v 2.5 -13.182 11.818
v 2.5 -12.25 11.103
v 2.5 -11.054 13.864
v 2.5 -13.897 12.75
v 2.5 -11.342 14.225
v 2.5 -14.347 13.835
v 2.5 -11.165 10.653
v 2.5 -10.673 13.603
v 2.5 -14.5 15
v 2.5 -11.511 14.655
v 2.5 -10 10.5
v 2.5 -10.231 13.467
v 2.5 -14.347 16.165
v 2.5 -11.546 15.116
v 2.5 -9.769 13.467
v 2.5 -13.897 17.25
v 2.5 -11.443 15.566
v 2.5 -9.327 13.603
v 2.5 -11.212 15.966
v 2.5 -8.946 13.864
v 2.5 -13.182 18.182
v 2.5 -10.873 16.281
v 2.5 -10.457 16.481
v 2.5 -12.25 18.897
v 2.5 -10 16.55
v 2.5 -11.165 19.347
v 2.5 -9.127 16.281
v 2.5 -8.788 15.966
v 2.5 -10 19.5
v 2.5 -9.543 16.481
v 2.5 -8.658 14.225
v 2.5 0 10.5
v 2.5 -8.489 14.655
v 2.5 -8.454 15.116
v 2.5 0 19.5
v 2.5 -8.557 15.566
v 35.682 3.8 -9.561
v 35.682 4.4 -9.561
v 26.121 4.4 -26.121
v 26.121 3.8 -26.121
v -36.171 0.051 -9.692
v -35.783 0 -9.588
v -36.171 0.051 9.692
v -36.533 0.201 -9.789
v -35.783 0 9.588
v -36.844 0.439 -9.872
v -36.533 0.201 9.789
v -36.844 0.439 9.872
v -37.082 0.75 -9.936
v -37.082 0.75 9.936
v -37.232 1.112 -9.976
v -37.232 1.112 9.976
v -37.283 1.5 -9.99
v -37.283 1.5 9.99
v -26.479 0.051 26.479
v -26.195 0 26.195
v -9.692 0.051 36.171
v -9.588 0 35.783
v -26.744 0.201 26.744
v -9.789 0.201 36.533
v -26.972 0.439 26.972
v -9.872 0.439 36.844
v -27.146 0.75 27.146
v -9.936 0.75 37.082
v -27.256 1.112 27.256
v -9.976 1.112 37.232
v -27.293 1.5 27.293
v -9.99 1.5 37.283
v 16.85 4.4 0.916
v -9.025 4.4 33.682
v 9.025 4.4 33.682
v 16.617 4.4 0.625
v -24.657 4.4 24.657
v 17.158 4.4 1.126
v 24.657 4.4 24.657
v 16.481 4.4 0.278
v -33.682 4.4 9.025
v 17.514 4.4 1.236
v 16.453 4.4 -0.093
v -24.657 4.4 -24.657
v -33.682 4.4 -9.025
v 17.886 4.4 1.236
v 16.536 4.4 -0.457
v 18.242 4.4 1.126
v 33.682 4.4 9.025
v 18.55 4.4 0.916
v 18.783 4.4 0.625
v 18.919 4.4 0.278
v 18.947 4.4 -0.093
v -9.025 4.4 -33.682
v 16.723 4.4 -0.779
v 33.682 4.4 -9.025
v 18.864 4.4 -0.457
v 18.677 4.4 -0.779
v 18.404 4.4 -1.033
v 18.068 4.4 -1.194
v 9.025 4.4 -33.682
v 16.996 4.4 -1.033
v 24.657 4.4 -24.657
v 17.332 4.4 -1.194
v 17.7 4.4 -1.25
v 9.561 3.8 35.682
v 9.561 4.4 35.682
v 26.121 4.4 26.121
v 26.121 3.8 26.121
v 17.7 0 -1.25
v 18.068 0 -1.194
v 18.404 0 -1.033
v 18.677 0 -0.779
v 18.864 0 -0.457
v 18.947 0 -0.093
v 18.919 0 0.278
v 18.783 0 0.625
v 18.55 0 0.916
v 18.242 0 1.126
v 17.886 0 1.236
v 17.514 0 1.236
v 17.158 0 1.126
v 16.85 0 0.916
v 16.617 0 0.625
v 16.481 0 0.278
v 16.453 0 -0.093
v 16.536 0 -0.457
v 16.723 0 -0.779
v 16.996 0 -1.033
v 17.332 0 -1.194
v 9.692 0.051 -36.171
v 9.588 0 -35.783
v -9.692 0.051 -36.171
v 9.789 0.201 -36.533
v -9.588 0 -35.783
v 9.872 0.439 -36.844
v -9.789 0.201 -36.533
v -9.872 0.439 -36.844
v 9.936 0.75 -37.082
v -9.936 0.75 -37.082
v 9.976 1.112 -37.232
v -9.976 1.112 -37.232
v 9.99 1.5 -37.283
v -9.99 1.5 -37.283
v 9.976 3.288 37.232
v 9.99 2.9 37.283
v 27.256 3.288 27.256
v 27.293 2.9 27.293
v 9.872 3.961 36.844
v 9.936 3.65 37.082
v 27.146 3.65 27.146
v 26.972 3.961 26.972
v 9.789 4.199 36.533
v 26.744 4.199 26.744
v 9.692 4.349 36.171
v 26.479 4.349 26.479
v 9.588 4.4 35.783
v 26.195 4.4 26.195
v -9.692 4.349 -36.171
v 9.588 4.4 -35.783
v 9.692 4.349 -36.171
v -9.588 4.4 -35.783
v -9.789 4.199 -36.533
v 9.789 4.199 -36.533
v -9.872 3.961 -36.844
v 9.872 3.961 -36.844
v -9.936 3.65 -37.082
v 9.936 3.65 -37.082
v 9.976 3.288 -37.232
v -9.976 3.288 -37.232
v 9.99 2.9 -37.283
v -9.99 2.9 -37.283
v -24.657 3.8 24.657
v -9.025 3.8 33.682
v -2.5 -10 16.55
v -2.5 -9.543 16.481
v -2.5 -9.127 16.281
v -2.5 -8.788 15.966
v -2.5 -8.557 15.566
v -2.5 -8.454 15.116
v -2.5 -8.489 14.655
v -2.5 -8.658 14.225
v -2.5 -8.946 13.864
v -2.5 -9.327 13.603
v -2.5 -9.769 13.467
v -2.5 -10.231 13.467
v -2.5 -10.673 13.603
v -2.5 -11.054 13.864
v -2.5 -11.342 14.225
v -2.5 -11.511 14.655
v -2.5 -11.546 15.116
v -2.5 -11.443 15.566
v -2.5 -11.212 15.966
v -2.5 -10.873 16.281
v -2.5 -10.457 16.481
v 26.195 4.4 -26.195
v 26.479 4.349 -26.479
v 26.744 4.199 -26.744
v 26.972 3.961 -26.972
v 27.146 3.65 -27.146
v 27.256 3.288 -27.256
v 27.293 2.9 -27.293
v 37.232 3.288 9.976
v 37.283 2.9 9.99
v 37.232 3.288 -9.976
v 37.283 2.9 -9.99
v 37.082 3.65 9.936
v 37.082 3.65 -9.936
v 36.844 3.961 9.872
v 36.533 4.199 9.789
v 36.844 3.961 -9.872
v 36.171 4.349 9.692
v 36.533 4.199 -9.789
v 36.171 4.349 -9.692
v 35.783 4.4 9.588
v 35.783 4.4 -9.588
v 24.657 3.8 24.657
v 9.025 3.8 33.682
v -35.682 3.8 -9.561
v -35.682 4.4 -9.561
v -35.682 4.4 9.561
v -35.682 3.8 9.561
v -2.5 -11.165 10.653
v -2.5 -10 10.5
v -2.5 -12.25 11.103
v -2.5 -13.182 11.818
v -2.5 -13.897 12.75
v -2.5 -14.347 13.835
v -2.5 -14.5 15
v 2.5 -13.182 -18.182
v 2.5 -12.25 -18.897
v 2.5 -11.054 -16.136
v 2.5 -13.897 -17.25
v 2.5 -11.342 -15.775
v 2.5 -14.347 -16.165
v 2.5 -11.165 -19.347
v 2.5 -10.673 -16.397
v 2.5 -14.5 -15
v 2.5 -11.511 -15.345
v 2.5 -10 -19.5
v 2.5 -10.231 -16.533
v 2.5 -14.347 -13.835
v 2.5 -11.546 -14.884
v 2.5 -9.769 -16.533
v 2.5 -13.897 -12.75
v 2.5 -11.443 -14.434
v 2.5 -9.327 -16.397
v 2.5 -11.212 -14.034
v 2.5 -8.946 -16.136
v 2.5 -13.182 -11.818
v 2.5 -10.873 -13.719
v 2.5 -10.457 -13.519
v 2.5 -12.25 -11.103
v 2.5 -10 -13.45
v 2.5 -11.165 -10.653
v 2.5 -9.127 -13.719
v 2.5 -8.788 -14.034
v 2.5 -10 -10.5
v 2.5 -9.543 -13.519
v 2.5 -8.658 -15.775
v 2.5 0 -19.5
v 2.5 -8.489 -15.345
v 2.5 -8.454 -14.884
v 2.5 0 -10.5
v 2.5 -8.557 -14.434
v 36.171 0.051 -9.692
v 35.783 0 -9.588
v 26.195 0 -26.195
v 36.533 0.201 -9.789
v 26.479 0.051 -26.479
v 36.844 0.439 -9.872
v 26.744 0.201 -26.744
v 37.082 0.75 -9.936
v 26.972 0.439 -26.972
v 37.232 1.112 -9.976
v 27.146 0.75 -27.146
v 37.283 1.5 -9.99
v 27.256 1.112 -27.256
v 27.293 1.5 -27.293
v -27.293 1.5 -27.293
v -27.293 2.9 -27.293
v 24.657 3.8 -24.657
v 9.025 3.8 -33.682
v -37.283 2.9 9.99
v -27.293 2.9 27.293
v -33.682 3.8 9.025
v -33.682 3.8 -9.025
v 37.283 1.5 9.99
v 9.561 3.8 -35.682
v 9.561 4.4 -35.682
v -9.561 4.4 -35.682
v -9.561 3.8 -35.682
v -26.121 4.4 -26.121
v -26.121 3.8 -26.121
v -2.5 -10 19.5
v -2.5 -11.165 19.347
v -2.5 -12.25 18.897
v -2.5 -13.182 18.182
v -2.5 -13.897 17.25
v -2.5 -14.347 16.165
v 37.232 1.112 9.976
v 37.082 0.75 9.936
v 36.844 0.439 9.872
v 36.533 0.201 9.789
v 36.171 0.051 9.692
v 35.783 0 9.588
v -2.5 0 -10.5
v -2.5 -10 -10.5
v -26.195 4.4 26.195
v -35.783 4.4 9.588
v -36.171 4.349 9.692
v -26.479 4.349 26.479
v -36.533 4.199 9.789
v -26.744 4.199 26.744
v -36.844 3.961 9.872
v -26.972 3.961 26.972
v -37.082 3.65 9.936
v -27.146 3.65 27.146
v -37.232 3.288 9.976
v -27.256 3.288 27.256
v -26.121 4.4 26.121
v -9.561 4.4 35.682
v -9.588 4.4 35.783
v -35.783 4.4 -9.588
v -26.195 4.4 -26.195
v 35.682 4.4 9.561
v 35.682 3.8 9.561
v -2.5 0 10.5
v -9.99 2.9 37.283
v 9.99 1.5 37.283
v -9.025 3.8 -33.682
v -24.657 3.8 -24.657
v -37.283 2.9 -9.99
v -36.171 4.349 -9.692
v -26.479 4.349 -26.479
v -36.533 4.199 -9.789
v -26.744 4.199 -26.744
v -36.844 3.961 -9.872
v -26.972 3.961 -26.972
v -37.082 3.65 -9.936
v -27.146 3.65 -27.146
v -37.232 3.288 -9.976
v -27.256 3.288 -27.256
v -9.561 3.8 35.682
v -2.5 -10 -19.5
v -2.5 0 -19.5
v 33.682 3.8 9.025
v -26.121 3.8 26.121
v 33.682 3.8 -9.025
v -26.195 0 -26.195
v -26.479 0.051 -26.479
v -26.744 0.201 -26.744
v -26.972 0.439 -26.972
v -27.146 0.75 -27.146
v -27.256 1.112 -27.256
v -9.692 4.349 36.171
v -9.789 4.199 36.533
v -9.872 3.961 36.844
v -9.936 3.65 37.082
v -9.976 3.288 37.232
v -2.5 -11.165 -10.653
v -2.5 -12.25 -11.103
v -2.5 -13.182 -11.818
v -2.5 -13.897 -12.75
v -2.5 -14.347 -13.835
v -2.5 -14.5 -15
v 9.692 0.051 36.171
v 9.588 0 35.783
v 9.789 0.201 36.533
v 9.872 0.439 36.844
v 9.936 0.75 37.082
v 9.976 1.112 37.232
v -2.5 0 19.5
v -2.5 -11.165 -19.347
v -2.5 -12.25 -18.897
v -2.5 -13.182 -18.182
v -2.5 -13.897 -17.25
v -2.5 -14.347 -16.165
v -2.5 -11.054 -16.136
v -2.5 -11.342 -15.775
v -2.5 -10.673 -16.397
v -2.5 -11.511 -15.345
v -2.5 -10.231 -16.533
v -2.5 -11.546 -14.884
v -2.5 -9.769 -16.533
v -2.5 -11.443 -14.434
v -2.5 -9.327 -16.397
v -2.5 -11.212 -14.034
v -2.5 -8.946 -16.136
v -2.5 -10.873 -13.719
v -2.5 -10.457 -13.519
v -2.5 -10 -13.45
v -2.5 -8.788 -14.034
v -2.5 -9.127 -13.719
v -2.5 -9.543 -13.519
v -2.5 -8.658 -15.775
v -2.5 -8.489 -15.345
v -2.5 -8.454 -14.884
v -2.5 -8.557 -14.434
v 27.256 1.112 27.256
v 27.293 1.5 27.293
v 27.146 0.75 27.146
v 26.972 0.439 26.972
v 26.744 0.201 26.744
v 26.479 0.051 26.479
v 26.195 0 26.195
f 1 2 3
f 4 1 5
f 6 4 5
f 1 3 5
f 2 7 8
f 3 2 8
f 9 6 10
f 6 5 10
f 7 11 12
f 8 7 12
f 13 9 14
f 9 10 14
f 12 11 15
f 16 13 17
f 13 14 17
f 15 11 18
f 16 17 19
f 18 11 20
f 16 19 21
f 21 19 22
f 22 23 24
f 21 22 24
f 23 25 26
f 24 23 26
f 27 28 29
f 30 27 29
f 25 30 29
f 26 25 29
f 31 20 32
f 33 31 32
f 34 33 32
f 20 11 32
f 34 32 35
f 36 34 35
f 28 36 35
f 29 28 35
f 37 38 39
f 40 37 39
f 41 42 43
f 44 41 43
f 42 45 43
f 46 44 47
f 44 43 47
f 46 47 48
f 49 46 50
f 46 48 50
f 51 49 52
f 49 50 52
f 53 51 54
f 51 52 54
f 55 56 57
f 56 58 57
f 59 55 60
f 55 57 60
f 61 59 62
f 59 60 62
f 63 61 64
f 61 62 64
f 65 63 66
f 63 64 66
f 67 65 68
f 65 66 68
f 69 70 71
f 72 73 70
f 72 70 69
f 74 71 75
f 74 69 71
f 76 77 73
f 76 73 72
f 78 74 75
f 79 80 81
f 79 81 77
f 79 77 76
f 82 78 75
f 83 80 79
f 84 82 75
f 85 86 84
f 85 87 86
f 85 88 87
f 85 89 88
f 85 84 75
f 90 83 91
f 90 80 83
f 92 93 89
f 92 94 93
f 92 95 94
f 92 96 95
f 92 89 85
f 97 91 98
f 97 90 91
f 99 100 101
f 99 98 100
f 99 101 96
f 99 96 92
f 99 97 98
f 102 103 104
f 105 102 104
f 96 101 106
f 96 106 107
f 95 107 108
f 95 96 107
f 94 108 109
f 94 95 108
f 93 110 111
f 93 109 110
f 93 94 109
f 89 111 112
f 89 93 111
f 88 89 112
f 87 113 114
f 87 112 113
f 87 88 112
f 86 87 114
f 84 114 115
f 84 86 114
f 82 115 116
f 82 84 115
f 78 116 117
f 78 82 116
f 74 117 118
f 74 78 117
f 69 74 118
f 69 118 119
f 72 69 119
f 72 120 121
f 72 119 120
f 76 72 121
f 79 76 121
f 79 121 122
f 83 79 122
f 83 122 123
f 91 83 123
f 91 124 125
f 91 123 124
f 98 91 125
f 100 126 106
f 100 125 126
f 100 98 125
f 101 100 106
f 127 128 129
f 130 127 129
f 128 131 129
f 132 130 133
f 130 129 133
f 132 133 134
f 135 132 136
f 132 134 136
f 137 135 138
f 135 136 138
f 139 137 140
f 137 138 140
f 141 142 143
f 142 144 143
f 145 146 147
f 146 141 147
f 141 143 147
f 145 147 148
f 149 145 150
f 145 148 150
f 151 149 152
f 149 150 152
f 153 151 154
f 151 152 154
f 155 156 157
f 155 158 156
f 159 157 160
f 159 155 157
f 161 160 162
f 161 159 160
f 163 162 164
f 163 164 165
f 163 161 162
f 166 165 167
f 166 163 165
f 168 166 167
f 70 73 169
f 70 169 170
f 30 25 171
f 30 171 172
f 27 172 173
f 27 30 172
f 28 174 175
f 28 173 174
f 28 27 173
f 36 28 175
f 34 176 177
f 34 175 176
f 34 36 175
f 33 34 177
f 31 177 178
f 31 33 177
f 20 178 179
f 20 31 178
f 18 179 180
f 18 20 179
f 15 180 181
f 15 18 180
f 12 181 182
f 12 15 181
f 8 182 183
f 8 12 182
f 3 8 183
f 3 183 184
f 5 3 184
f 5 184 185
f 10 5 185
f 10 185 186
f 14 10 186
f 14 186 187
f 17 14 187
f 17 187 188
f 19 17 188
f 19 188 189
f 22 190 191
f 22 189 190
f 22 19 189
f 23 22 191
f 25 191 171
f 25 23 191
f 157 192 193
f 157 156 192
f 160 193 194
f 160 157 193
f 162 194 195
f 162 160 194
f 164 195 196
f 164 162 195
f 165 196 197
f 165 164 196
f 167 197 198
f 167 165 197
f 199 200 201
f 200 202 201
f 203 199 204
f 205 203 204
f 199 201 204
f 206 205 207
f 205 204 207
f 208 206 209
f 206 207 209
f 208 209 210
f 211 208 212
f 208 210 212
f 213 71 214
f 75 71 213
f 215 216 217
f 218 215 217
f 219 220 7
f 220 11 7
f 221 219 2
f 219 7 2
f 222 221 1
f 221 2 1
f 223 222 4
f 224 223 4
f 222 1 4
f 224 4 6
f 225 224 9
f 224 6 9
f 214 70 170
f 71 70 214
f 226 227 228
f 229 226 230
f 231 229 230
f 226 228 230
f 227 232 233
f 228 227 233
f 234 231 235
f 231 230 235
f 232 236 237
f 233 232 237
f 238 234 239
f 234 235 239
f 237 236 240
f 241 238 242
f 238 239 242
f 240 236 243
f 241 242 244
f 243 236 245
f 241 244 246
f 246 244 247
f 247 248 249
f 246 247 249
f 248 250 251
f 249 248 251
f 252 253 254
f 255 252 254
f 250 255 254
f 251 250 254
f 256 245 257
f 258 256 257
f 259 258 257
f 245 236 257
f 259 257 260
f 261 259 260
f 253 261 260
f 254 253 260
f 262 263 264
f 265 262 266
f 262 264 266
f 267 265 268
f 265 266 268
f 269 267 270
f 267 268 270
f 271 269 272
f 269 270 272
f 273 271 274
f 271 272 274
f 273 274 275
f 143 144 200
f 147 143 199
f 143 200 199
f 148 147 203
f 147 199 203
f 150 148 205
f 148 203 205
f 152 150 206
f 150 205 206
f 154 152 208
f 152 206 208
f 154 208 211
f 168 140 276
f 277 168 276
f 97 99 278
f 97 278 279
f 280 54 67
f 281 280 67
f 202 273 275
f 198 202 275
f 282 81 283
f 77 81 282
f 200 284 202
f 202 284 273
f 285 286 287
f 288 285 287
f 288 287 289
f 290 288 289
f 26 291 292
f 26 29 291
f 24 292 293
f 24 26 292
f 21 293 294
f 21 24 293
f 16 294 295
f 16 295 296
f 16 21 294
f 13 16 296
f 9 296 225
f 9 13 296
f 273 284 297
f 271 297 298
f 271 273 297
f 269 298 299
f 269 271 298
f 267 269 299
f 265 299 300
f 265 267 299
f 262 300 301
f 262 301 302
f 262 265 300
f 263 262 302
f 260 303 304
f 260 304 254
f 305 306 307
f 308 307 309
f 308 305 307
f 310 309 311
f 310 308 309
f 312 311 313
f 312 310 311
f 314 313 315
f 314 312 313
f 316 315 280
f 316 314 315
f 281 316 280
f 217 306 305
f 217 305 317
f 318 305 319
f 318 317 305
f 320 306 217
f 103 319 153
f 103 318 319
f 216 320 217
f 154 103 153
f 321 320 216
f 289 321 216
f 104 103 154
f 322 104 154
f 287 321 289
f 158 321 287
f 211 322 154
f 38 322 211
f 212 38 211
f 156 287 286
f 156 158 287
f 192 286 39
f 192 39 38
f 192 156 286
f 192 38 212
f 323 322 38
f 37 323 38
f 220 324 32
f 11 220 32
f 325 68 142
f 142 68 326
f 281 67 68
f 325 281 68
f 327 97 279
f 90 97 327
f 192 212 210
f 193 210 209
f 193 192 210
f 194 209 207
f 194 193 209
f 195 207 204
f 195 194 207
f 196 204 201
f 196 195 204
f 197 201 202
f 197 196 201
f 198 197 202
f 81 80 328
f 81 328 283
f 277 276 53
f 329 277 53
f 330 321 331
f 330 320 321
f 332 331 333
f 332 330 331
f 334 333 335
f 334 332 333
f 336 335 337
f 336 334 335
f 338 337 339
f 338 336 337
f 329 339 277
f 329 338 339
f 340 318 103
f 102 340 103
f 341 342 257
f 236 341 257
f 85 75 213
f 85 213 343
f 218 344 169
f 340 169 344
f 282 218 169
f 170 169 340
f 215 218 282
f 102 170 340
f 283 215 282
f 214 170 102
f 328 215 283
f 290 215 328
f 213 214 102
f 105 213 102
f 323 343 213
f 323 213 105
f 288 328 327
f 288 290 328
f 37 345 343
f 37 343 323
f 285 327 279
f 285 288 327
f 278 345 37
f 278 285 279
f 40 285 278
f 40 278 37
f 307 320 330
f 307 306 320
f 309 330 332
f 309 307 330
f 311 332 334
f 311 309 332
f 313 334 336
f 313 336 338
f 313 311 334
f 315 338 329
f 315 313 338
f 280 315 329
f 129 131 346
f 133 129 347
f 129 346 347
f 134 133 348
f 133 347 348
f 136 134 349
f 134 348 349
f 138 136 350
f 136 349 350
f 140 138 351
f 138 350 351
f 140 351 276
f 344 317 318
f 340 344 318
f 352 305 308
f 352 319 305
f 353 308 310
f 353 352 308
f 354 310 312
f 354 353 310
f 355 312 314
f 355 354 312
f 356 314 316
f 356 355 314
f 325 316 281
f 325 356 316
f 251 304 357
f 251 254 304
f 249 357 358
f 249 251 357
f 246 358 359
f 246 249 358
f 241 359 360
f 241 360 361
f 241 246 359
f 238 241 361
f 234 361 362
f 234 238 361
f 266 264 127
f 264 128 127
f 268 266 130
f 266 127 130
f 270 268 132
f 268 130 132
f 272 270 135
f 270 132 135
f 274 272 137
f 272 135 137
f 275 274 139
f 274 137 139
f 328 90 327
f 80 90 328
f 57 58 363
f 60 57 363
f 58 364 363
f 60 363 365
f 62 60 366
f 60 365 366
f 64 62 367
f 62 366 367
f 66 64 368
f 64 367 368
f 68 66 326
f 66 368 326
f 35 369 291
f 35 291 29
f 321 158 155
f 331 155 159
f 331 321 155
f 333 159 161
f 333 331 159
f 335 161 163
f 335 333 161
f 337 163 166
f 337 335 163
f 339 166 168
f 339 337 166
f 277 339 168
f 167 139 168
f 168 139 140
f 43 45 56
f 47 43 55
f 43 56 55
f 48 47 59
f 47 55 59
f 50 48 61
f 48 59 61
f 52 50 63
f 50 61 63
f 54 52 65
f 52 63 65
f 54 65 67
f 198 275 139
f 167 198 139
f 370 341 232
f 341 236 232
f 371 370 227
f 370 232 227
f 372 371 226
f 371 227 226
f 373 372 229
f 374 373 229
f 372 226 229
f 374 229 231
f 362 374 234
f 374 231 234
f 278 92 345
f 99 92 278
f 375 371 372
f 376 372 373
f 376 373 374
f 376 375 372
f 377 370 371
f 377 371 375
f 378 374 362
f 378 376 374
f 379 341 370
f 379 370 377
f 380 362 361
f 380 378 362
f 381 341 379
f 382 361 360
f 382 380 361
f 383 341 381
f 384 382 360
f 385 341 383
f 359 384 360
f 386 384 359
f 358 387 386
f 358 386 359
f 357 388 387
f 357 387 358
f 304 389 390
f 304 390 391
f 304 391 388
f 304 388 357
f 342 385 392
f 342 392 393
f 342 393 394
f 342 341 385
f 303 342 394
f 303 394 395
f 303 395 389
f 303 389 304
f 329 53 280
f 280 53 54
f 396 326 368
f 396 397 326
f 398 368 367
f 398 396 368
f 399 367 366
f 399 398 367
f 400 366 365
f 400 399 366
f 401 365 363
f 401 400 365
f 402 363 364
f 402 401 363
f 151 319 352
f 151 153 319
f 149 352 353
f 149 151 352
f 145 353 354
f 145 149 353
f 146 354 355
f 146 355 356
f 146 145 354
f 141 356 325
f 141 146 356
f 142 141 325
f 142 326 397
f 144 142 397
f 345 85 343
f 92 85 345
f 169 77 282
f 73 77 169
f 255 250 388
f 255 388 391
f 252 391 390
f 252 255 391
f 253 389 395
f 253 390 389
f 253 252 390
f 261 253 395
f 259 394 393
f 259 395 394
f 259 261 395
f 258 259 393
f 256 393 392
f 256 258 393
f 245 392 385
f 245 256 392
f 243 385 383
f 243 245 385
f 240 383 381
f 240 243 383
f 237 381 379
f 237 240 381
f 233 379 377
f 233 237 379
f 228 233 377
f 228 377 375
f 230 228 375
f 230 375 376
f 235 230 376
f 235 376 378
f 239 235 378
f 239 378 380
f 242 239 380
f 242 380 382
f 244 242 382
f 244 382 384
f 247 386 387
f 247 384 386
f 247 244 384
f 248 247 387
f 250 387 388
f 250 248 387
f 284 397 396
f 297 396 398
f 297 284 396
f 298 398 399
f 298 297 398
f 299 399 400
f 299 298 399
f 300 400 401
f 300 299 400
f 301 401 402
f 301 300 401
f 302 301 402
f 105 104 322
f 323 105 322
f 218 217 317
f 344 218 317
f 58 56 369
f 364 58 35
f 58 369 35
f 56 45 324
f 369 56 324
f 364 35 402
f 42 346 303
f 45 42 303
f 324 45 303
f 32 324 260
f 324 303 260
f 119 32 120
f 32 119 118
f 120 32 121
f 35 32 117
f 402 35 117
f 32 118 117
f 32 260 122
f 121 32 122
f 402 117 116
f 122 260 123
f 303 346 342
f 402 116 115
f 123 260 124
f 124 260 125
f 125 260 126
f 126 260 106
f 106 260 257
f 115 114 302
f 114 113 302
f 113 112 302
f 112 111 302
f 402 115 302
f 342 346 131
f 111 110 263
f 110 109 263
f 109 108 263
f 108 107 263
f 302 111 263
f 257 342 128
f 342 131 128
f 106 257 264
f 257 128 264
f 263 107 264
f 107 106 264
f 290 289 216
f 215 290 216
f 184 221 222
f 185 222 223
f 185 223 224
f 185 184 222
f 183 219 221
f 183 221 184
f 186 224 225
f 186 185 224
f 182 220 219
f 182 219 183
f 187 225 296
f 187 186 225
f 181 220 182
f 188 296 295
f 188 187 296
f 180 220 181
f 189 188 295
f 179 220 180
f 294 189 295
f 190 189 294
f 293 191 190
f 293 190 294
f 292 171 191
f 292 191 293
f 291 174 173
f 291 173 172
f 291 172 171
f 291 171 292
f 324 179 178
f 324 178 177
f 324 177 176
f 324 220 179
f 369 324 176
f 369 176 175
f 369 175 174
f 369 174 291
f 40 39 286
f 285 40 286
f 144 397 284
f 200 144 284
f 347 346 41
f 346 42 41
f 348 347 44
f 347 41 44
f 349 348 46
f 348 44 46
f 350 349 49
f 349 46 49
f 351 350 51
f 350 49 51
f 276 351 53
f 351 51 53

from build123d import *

# Parameters (mm, degrees)
EXTRUDE_1_DEPTH          = 4.4
CUT_EXTRUDE_1_DEPTH      = 0.6
FILLET_1_R               = 1.5
SKETCH_3_W               = 5
SKETCH_3_H               = 9
EXTRUDE_2_DEPTH          = 14.5
FILLET_2_R               = 4.5
CUT_EXTRUDE_2_DEPTH      = 57.417976641
CUT_EXTRUDE_2_DEPTH_BACK = 57.417976641
SKETCH_4_R               = 1.55
CUT_EXTRUDE_3_DEPTH      = 55.68383811
CUT_EXTRUDE_3_DEPTH_BACK = 55.68383811
SKETCH_5_R               = 1.25


with BuildPart() as part:
    # 스케치1 → 보스-돌출1 (new body)
    with BuildSketch(Plane(origin=(0, 0, 0), x_dir=(1, 0, 0), z_dir=(0, 1, 0))):
        Polygon((27.293187568, -27.293187568), (37.283187568, -9.99), (37.283187568, 9.99), (27.293187568, 27.293187568), (9.99, 37.283187568), (-9.99, 37.283187568), (-27.293187568, 27.293187568), (-37.283187568, 9.99), (-37.283187568, -9.99), (-27.293187568, -27.293187568), (-9.99, -37.283187568), (9.99, -37.283187568), align=None)
    extrude(amount=EXTRUDE_1_DEPTH)

    # 스케치2 → 컷-돌출1 (cut)
    with BuildSketch(Plane(origin=(0, 4.4, 0), x_dir=(1, 0, 0), z_dir=(0, 1, 0))):
        Polygon((-26.120860153, 26.120860153), (-35.681758538, 9.560898385), (-35.681758538, -9.560898385), (-26.120860153, -26.120860153), (-9.560898385, -35.681758538), (9.560898385, -35.681758538), (26.120860153, -26.120860153), (35.681758538, -9.560898385), (35.681758538, 9.560898385), (26.120860153, 26.120860153), (9.560898385, 35.681758538), (-9.560898385, 35.681758538), align=None)
        Polygon((24.656758538, -24.656758538), (33.681758538, -9.025), (33.681758538, 9.025), (24.656758538, 24.656758538), (9.025, 33.681758538), (-9.025, 33.681758538), (-24.656758538, 24.656758538), (-33.681758538, 9.025), (-33.681758538, -9.025), (-24.656758538, -24.656758538), (-9.025, -33.681758538), (9.025, -33.681758538), align=None, mode=Mode.SUBTRACT)
    extrude(amount=-CUT_EXTRUDE_1_DEPTH, mode=Mode.SUBTRACT)

    # 필렛1
    fillet_1_edges = [part.edges().sort_by_distance(p)[0] for p in [
        (0, 0, 37.283187568),
        (-18.641593784, 0, 32.288187568),
        (37.283187568, 4.4, 0),
        (-32.288187568, 0, 18.641593784),
        (-37.283187568, 0, 0),
        (-32.288187568, 0, -18.641593784),
        (-18.641593784, 0, -32.288187568),
        (0, 0, -37.283187568),
        (18.641593784, 0, -32.288187568),
        (32.288187568, 0, -18.641593784),
        (37.283187568, 0, 0),
        (32.288187568, 0, 18.641593784),
        (18.641593784, 0, 32.288187568),
        (32.288187568, 4.4, -18.641593784),
        (18.641593784, 4.4, -32.288187568),
        (0, 4.4, -37.283187568),
        (-18.641593784, 4.4, -32.288187568),
        (-32.288187568, 4.4, -18.641593784),
        (-37.283187568, 4.4, 0),
        (-32.288187568, 4.4, 18.641593784),
        (-18.641593784, 4.4, 32.288187568),
        (0, 4.4, 37.283187568),
        (18.641593784, 4.4, 32.288187568),
        (32.288187568, 4.4, 18.641593784),
    ]]
    fillet(fillet_1_edges, radius=FILLET_1_R)

    # 스케치3 → 보스-돌출2 (add)
    with BuildSketch(Plane.XZ):
        with Locations((0, -15)):
            Rectangle(SKETCH_3_W, SKETCH_3_H)
        with Locations((0, 15)):
            Rectangle(SKETCH_3_W, SKETCH_3_H)
    extrude(amount=EXTRUDE_2_DEPTH)

    # 필렛2
    fillet_2_edges = [part.edges().sort_by_distance(p)[0] for p in [
        (0, -14.5, -19.5),
        (0, -14.5, -10.5),
        (0, -14.5, 19.5),
        (0, -14.5, 10.5),
    ]]
    fillet(fillet_2_edges, radius=FILLET_2_R - 0.0001)  # a hair under: the kernel refuses the full size

    # 스케치4 → 컷-돌출2 (cut, two sides: drawn at the far end of the back side and taken through both)
    with BuildSketch(Plane.ZY.offset(2.5).offset(-CUT_EXTRUDE_2_DEPTH_BACK)):
        with Locations((-15, -10)):
            Circle(SKETCH_4_R)
        with Locations((15, -10)):
            Circle(SKETCH_4_R)
    extrude(amount=CUT_EXTRUDE_2_DEPTH + CUT_EXTRUDE_2_DEPTH_BACK, mode=Mode.SUBTRACT)

    # 스케치5 → 컷-돌출3 (cut, two sides: drawn at the far end of the back side and taken through both)
    with BuildSketch(Plane.XZ.offset(-CUT_EXTRUDE_3_DEPTH_BACK)):
        with Locations(Location((17.7, 0, 0), (0, 0, 270))):
            Circle(SKETCH_5_R)
    extrude(amount=CUT_EXTRUDE_3_DEPTH + CUT_EXTRUDE_3_DEPTH_BACK, mode=Mode.SUBTRACT)


solid = part.part
